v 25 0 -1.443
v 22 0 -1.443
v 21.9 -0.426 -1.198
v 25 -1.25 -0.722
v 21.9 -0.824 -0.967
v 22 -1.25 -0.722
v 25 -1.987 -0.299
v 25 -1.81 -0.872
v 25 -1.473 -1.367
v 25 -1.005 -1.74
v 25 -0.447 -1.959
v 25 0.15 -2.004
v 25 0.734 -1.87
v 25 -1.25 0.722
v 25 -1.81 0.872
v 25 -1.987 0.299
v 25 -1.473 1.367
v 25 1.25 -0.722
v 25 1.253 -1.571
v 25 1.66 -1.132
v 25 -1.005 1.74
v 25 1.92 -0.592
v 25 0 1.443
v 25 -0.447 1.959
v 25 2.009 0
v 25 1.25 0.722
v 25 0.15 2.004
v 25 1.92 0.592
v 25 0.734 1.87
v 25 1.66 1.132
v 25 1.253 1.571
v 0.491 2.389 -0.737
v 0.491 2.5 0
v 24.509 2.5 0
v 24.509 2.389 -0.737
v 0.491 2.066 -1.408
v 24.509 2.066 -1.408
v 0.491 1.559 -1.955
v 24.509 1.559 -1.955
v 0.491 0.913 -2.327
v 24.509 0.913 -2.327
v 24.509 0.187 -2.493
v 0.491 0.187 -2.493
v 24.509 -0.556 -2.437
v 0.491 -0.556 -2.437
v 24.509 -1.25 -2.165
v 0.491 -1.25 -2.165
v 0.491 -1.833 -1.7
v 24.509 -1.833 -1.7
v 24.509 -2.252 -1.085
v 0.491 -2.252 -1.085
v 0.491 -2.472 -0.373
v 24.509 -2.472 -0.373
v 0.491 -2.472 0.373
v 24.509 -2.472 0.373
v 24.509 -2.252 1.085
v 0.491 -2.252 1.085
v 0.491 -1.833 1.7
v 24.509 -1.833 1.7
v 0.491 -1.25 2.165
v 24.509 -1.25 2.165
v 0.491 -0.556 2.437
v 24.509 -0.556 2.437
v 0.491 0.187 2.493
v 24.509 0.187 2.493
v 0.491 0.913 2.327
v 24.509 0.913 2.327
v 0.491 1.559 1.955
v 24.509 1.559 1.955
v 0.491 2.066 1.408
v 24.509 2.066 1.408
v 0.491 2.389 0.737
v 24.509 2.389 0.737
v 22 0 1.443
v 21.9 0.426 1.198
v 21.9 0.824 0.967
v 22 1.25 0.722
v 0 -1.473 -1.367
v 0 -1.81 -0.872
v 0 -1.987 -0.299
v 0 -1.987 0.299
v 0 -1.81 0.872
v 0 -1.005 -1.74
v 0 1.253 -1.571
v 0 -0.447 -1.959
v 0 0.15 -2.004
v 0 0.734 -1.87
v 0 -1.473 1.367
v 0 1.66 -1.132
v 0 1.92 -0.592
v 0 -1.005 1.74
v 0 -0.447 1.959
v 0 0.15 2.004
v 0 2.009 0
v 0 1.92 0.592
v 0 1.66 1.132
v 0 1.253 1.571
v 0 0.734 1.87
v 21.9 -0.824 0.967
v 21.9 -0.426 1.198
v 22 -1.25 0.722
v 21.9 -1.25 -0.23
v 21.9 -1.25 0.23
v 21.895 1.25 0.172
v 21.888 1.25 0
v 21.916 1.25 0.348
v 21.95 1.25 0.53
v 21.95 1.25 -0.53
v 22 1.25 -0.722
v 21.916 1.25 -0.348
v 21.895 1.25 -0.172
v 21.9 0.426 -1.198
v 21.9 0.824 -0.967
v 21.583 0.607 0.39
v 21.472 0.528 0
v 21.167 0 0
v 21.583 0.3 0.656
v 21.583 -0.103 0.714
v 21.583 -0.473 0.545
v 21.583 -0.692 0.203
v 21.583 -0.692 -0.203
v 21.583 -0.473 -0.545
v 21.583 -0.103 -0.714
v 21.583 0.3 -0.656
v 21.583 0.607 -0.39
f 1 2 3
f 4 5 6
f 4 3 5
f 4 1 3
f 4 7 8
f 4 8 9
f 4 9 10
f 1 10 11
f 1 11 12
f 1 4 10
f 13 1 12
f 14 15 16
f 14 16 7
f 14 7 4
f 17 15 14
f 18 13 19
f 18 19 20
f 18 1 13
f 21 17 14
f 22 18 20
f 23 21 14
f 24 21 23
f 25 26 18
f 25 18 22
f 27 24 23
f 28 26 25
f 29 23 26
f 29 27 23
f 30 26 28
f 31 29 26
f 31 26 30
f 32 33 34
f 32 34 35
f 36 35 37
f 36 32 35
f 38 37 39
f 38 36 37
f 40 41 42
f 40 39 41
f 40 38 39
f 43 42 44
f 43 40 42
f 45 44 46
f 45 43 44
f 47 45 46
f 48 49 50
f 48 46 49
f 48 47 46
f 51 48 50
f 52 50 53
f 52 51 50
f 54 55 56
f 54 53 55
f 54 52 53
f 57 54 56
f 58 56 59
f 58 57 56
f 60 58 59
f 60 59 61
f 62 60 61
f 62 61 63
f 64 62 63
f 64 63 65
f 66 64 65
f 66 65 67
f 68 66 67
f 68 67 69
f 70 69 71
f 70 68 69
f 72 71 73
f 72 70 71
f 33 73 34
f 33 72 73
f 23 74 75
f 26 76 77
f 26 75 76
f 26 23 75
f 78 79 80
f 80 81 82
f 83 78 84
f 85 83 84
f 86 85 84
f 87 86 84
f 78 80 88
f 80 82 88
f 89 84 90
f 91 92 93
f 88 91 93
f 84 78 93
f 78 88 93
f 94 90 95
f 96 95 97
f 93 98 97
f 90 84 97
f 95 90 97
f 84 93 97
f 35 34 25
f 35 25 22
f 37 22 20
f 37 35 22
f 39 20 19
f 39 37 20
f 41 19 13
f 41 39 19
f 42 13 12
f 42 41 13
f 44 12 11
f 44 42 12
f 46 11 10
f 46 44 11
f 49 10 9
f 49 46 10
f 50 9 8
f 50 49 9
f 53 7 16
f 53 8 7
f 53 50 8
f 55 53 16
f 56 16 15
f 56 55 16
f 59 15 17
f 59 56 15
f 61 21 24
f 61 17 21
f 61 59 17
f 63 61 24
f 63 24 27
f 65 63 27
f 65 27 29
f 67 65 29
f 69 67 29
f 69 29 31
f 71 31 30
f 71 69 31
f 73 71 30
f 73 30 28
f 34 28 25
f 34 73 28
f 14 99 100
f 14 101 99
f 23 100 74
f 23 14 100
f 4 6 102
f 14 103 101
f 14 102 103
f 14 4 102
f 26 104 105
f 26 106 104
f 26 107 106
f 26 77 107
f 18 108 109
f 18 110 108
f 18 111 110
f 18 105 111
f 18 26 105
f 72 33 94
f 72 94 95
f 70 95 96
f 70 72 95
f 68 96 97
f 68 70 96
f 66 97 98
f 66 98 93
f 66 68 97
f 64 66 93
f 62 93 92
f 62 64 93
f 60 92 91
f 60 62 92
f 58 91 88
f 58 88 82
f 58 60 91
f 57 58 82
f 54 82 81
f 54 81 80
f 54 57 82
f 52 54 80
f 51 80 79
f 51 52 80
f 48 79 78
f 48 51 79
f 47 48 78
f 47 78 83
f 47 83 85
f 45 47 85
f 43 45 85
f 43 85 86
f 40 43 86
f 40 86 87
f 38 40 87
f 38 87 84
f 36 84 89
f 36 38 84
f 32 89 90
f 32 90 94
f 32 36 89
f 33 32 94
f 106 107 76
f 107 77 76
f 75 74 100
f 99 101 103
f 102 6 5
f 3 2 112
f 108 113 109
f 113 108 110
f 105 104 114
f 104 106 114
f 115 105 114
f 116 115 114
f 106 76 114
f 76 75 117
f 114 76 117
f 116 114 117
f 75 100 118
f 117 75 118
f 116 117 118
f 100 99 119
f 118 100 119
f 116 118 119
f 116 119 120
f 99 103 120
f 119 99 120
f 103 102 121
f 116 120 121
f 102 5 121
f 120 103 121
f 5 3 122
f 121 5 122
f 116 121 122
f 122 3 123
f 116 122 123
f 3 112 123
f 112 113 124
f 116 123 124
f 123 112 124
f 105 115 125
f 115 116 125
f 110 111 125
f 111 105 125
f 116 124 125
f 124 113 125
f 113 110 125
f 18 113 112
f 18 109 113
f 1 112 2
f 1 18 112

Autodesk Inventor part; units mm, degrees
ref_plane "YZ Plane" through (0, 0, 0) normal (1, 0, 0) x (0, 1, 0)
ref_plane "XZ Plane" through (0, 0, 0) normal (0, 1, 0) x (-1, 0, 0)
sketch "Sketch1" plane through (0, 0, 0) normal (0, 0, 1) x (1, 0, 0)
  line L0 (0, 0) -> (21.1667, 0)
  line L1 (25, 1.4434) -> (25, 2.5)
  line L2 (25, 2.5) -> (0, 2.5)
  line L3 (25, 1.4434) -> (22, 1.4434)
  line L4 (22, 1.4434) -> (21.1667, 0)
  line L5 (0, -0.5) -> (0, 3) projected
  line L6 (0, 2.5) -> (0, 0)
  dimension "d0" = 3
  dimension "d1" = 60
  dimension "d2" = 5
  dimension "d3" = 2.8868
  dimension "d5" = 25
revolve "Body" add sketch "Sketch1" angle 360 about axis through (0, 0, 0) along (1, 0, 0)
chamfer "Chamfer1" distance 0.4908 angle 45 1 edges at (25, -2.5, 0) measured on face at (25, 2.1236, -0.1994)
sketch "Sketch2" plane through (25, 0, 0) normal (1, 0, 0) x (0, 0, -1)
  circle A0 centre (0, 0) radius 1.4434 projected
  line L0 (-0.7217, 1.25) -> (0.7217, 1.25)
  line L1 (0.7217, 1.25) -> (1.4434, 0)
  line L2 (1.4434, 0) -> (0.7217, -1.25)
  line L3 (0.7217, -1.25) -> (-0.7217, -1.25)
  line L4 (-0.7217, -1.25) -> (-1.4434, 0)
  line L5 (-1.4434, 0) -> (-0.7217, 1.25)
  point P0 (0, 0)
  point P1 (0, 0)
extrude "Slot" add sketch "Sketch2" against normal up to next contours L1 A0 | A0 L2 | L0 A0 | A0 L3 | L5 A0 | A0 L4
thread "Thread" size "M5x0.8" class "6g" standard "ISO Metric profile" length 25
chamfer "Chamfer2" distance 0.4908 angle 45 1 edges at (0, -2.5, 0) measured on face at (8.1697, 2.4919, -0.2012)
ref_plane "Work Plane1" through (12.5, 0, 0) normal (0, 0.5, 0.866) x (1, 0, 0)
equation "\"d7\" = -0.5 * GD1 + 0.5 * NND"
equation "\"d8\" = FAWI"
equation "\"d29\" = -0.5 * GD1 + 0.5 * NND"
equation "\"d11\" = NLG"
equation "\"d13\" = -0.5 * GD1 + 0.5 * NND"
equation "\"d14\" = FAWI"
equation "\"d30\" = -0.5 * GD1 + 0.5 * NND"
equation "\"d0\" = INTI"
equation "\"d2\" = NND"
equation "\"d3\" = 1.1547 * SW"
equation "\"d5\" = NLG"
equation "\"NND\" = 5"
equation "\"NLG\" = 25"
equation "\"INTI\" = 3"
equation "\"FAWI\" = 45deg"
equation "\"SW\" = 2.5"
equation "\"GD1\" = THREADDIA - 1.2269 * PTC"
equation "\"FAWI1\" = 45deg"
equation "\"GUL\" = 0.61345 * PTC"
equation "\"SPD\" = 3.5"
equation "\"SEWI\" = 90deg"
equation "\"TOA\" = 30deg"
equation "\"THREADDIA\" = 5"
equation "\"PTC\" = 0.8"
equation "\"GAL\" = 0.61345 * PTC"
equation "\"E0\" = 1.155 * SW"
properties part number "DIN EN ISO 4026 - M5 x 25" material "Stainless Steel, 440C"
